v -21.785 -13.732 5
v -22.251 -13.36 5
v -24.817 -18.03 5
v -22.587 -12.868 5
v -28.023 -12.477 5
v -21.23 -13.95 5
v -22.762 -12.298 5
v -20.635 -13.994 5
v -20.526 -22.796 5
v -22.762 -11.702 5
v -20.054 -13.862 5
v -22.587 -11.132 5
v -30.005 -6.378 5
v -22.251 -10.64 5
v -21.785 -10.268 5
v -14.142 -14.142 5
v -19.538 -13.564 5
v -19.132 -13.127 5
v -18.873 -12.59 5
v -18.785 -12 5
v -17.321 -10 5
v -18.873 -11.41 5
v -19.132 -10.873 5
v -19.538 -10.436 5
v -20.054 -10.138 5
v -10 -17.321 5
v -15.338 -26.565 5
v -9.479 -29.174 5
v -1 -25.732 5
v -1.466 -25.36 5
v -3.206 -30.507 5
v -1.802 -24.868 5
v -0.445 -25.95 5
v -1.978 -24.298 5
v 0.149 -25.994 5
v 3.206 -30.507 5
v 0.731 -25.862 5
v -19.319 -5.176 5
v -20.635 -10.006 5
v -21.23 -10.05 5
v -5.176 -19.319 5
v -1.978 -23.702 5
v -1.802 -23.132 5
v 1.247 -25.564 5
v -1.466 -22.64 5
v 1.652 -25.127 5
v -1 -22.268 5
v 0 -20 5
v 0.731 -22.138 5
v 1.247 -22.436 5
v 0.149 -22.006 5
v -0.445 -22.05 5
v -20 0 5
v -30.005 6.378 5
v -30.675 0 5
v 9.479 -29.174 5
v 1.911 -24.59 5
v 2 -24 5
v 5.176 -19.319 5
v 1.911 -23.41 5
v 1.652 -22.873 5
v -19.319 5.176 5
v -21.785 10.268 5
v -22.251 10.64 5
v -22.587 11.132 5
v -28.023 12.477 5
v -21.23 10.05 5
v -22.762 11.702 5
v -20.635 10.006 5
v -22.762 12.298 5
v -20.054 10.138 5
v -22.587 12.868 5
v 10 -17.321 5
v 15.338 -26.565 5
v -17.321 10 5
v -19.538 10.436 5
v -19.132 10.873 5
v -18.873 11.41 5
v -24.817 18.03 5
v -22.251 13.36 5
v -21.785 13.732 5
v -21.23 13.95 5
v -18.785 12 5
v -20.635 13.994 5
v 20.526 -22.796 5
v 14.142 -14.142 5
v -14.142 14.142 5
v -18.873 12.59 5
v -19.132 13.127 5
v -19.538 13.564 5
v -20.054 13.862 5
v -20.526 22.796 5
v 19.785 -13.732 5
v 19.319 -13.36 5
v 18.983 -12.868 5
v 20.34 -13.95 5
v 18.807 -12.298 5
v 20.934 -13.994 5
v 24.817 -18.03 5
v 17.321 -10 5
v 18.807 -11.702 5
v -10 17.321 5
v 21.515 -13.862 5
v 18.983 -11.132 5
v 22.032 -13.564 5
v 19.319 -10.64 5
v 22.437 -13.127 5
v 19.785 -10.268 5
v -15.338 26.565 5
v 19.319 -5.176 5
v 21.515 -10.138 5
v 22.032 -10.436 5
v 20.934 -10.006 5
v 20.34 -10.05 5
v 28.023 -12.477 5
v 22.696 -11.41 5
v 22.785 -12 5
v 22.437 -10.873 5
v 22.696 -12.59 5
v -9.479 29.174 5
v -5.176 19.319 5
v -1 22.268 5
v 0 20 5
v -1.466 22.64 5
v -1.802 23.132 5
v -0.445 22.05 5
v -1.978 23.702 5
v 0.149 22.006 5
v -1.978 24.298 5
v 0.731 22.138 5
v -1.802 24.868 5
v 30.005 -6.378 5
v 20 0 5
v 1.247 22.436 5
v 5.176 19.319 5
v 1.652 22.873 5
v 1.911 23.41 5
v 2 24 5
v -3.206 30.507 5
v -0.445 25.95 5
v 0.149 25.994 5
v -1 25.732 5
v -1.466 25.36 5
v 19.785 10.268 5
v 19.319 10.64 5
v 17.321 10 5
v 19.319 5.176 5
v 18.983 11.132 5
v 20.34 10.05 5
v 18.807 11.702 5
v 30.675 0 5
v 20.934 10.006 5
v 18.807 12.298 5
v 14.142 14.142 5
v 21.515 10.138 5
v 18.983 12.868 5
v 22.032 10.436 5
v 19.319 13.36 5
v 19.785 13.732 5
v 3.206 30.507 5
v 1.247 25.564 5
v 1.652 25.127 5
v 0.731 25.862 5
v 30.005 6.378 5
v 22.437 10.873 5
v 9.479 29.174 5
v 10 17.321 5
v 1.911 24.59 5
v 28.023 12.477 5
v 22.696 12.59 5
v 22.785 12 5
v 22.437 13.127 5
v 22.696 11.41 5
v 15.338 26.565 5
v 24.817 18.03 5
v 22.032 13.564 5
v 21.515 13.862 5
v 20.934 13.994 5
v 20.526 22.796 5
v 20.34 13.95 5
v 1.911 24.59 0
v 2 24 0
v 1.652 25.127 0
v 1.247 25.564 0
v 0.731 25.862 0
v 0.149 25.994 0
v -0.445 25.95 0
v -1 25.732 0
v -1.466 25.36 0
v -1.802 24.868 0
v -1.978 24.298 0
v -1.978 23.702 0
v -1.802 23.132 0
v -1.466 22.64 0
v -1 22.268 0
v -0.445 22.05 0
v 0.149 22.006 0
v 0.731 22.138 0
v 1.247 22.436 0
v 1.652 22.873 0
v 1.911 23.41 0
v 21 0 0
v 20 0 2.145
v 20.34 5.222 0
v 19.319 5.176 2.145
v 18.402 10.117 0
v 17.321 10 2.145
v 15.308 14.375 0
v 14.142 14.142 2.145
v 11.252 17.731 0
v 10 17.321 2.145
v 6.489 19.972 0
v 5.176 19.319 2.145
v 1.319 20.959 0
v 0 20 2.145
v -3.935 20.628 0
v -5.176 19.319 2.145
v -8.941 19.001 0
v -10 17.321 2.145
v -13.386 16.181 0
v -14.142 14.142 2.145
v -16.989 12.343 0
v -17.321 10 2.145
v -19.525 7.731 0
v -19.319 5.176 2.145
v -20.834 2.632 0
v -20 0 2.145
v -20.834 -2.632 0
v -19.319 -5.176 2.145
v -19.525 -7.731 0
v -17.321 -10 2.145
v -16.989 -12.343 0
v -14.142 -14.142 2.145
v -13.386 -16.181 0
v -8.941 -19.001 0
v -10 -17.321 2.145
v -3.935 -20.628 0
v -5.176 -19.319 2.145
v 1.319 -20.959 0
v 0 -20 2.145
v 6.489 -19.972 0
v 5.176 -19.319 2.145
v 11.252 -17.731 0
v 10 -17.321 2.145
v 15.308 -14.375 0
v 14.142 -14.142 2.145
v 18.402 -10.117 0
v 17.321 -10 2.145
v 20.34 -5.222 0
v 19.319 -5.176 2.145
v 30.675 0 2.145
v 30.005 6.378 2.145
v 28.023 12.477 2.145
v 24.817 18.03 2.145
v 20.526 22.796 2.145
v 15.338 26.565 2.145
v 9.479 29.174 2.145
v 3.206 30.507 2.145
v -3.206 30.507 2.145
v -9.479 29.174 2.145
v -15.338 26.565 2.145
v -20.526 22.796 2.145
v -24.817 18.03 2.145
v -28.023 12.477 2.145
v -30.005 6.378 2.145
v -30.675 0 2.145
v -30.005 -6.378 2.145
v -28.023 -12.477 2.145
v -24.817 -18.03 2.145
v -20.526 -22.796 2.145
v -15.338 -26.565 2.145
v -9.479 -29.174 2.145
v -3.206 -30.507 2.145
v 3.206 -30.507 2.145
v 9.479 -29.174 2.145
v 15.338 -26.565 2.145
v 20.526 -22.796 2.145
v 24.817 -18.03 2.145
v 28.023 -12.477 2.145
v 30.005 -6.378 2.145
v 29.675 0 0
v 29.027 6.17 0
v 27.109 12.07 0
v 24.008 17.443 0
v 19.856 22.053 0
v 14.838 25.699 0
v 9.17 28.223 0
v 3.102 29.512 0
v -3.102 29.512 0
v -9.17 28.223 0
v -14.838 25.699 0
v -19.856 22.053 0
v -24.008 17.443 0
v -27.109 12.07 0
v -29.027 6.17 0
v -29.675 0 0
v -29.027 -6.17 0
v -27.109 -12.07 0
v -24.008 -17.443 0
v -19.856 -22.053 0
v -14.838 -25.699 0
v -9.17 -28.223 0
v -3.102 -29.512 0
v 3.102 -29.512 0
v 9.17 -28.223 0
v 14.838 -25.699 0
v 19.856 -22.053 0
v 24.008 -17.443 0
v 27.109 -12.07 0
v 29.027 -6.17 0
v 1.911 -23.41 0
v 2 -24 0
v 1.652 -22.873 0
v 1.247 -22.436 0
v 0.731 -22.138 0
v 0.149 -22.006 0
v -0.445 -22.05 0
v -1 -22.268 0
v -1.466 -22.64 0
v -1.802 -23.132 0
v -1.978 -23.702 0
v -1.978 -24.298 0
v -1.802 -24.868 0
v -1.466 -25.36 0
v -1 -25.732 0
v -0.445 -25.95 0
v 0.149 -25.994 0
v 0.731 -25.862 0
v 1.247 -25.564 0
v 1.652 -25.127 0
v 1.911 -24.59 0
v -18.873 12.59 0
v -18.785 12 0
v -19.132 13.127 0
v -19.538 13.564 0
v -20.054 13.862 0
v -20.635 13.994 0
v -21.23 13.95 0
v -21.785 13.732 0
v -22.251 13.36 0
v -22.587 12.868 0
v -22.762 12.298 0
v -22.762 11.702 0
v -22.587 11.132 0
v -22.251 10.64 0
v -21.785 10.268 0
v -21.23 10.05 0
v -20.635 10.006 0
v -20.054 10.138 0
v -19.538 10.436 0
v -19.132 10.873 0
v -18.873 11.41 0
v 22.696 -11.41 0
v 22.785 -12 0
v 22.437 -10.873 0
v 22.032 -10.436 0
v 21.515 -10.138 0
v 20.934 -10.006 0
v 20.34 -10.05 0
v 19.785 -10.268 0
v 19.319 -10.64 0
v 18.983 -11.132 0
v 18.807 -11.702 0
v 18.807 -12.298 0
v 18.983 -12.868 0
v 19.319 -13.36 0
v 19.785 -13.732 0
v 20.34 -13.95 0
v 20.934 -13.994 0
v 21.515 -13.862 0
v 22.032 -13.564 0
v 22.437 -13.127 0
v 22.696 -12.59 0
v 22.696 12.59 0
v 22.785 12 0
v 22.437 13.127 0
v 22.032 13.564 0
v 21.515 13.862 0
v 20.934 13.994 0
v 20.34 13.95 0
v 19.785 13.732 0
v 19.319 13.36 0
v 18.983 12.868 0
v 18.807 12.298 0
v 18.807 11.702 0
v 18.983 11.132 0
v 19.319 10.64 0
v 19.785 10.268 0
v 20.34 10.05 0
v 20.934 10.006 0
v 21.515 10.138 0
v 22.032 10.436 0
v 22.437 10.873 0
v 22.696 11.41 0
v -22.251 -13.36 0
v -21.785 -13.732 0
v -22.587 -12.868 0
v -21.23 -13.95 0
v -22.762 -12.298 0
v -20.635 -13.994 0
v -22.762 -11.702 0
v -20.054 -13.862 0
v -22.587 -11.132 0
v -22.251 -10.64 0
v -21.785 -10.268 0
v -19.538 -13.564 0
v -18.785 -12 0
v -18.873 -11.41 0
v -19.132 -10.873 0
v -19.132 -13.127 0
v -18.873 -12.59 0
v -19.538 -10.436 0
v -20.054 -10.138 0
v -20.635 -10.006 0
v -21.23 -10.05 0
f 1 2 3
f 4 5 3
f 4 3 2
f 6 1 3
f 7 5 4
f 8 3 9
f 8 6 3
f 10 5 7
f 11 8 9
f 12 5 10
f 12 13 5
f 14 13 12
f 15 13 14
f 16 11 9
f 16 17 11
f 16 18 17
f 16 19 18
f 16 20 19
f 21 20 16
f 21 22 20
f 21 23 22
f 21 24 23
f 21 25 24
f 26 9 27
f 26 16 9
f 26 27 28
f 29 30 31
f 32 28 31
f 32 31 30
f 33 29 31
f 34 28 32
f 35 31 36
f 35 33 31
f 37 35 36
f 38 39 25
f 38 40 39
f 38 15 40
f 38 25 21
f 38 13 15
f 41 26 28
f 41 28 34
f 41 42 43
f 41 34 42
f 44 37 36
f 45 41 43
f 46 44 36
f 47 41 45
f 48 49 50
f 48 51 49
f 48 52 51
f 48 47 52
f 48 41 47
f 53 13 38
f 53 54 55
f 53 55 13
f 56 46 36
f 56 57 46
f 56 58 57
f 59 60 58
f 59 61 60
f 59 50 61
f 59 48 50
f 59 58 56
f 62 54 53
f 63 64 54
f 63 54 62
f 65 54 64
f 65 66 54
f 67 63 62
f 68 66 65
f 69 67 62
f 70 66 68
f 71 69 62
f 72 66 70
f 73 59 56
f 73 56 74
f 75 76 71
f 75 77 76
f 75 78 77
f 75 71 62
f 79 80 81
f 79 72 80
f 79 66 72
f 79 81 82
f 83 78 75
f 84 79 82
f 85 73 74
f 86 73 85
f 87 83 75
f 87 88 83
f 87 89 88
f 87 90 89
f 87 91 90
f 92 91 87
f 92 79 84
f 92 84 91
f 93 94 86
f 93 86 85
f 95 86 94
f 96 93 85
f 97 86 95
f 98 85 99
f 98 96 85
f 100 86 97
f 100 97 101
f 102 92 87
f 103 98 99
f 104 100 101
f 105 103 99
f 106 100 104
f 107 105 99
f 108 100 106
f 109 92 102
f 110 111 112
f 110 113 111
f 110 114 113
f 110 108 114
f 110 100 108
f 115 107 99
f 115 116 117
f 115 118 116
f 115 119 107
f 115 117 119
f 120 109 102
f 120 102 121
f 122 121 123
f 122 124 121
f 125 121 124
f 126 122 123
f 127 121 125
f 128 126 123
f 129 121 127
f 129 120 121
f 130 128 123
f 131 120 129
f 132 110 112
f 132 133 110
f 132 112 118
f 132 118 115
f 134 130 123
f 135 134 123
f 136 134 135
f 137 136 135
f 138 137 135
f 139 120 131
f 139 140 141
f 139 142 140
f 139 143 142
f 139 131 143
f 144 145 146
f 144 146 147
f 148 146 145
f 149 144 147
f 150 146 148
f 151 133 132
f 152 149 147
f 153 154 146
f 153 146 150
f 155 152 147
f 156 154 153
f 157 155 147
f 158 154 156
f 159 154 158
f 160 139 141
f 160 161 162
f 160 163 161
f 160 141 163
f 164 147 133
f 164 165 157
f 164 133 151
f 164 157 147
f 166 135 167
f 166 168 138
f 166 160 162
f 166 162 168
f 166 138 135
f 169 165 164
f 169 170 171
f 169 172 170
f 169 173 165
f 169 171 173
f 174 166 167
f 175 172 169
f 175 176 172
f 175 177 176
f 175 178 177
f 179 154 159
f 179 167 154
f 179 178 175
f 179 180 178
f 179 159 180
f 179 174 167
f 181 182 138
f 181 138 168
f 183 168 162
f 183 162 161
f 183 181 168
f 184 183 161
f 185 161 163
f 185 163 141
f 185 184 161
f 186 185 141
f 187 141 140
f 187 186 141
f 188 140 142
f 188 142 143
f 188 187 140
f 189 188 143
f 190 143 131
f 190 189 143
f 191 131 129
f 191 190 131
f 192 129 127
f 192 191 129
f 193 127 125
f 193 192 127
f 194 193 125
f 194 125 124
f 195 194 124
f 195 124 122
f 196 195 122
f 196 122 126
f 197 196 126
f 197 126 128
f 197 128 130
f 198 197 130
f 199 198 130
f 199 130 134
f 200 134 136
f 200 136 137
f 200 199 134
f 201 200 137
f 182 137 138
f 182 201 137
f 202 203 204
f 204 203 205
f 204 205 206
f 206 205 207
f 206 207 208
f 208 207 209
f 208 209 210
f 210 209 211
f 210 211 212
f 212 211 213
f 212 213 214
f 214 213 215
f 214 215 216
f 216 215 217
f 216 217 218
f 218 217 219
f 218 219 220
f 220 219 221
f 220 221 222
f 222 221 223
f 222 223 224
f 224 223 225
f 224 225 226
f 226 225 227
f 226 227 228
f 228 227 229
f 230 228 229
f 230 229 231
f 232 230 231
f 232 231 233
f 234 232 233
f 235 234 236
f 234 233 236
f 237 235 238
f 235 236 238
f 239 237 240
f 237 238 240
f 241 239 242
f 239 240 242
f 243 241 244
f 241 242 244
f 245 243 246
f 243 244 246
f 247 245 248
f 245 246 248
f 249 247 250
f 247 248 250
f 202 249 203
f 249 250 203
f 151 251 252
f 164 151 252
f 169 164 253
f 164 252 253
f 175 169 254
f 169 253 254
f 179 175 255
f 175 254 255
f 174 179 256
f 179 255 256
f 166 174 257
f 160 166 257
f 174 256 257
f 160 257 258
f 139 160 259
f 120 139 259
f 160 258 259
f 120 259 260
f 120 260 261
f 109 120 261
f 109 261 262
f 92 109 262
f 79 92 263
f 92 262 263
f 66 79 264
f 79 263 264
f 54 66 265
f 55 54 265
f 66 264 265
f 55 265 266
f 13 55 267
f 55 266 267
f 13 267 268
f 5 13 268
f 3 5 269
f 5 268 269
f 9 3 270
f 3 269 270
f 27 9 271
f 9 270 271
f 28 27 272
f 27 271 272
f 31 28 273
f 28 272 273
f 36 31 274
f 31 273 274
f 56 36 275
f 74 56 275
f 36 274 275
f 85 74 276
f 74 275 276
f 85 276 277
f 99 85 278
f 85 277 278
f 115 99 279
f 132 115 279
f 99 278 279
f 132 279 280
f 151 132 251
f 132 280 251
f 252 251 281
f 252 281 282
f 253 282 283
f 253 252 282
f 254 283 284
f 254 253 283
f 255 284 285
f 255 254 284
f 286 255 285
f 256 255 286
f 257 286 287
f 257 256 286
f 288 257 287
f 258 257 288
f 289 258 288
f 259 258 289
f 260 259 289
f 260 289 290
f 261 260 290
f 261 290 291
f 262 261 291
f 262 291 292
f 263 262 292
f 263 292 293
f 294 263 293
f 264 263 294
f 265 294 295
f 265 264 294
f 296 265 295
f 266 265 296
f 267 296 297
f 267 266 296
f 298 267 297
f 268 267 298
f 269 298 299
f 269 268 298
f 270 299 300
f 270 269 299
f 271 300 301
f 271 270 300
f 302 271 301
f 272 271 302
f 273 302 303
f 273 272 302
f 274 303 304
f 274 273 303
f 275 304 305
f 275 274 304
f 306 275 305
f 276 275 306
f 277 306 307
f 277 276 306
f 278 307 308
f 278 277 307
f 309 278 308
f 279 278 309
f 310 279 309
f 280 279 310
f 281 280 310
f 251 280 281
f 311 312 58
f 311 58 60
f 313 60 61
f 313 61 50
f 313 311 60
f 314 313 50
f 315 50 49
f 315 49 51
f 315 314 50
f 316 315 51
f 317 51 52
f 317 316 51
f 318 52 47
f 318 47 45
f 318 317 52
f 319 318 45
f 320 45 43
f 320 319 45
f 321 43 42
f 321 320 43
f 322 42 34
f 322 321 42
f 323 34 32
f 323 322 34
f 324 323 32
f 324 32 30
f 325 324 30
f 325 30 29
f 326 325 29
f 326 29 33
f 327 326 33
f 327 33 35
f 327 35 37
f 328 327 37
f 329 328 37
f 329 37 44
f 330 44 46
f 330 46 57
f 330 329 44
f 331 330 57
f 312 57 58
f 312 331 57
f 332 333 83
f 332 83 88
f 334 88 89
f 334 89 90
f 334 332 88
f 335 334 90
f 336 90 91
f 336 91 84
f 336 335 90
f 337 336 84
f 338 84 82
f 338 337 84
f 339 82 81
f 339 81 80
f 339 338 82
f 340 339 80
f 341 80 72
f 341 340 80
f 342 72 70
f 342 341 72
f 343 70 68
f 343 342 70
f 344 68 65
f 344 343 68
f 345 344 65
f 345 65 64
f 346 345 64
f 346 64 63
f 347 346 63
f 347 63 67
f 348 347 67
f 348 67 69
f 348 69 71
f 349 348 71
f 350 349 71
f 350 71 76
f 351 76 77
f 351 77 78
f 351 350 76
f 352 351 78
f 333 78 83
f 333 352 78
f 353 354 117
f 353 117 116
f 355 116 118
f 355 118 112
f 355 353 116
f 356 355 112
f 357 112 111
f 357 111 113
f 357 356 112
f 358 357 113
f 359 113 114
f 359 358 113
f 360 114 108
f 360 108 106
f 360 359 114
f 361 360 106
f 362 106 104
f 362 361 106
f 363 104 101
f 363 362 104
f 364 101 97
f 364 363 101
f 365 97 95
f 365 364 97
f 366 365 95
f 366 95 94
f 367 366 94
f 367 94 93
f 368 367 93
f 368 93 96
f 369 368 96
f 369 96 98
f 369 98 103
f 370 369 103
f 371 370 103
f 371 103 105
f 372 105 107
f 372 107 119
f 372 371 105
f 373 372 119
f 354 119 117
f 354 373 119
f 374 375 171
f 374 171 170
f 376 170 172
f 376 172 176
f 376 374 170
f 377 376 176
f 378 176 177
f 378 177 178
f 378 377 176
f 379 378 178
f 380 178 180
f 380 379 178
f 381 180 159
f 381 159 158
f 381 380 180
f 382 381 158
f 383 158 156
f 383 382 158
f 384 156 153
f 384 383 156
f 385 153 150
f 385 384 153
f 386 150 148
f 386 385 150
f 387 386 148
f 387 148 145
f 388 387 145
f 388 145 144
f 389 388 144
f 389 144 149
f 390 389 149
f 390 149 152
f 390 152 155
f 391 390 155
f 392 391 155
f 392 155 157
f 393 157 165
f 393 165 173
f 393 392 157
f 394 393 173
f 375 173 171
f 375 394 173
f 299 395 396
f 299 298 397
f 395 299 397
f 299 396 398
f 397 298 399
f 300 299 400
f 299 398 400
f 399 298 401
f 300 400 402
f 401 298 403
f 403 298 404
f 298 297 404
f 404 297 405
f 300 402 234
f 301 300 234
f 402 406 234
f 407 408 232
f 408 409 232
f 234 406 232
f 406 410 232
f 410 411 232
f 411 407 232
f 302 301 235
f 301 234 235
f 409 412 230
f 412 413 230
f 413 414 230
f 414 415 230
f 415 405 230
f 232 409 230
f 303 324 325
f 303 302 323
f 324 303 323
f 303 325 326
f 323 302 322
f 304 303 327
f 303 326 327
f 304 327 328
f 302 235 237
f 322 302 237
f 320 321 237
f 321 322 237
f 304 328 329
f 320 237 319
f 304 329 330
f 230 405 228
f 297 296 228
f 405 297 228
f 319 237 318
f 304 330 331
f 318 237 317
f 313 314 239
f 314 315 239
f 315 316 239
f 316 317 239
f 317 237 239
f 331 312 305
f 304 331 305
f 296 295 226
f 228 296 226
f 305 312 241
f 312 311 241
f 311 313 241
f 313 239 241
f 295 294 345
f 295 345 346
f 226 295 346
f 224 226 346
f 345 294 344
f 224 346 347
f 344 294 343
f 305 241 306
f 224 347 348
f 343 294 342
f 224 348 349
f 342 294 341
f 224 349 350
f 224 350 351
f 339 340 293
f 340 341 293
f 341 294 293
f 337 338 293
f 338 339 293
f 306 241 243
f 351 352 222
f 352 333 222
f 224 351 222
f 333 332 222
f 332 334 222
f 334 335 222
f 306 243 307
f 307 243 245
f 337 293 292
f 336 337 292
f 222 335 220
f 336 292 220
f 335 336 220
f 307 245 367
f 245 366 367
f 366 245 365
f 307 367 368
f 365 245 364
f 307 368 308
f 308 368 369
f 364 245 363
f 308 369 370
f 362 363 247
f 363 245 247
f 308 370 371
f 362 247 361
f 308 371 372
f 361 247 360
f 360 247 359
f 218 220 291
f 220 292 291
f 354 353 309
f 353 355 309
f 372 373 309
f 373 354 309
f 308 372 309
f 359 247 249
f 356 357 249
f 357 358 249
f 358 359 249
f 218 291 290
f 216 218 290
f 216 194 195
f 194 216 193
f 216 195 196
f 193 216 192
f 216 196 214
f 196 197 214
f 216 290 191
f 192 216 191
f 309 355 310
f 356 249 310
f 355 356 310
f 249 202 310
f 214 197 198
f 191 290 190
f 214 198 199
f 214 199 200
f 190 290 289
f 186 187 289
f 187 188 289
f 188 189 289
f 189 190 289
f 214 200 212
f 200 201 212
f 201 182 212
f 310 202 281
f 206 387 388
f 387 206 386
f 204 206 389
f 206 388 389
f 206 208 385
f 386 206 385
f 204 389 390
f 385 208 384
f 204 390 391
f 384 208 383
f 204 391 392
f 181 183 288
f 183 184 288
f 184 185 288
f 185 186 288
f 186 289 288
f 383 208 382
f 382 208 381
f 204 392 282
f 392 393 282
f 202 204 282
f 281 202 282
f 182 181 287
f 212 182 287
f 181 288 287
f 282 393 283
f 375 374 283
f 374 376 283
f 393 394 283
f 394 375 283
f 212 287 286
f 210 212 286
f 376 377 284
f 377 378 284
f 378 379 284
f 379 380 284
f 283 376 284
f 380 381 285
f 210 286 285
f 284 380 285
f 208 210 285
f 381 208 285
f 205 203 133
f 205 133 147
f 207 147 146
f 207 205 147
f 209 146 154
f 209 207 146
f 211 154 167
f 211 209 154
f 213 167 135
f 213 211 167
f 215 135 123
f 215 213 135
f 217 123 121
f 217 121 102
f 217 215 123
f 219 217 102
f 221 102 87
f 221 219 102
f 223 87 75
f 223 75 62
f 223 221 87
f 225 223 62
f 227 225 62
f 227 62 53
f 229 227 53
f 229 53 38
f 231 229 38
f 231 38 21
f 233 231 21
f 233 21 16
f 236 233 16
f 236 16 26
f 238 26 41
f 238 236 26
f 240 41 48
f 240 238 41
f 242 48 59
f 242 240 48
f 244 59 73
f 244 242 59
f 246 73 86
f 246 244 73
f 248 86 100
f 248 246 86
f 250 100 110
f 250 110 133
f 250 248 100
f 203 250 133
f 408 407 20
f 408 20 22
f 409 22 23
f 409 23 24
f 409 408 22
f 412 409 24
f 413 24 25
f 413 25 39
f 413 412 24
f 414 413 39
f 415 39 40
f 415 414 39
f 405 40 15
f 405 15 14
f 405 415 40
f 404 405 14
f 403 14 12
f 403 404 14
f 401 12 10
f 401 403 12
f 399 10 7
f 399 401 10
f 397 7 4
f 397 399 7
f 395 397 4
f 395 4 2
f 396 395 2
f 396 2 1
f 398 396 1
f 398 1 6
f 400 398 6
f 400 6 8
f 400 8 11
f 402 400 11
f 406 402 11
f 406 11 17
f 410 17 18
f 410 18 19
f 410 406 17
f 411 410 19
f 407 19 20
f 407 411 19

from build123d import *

# Parameters (mm, degrees)
SKETCH1_R           = 30.675
SKETCH1_R_2         = 2
SKETCH1_R_3         = 20
BOSS_EXTRUDE1_DEPTH = 5
CHAMFER6_SIZE       = 1
CHAMFER6_SIZE2      = 2.144506921


with BuildPart() as part:
    # Sketch1 → Boss-Extrude1 (new body)
    with BuildSketch(Plane.XY):
        Circle(SKETCH1_R)
        with Locations((0, 24)):
            Circle(SKETCH1_R_2, mode=Mode.SUBTRACT)
        Circle(SKETCH1_R_3, mode=Mode.SUBTRACT)
        with Locations((20.784609691, 12)):
            Circle(SKETCH1_R_2, mode=Mode.SUBTRACT)
        with Locations((20.784609691, -12)):
            Circle(SKETCH1_R_2, mode=Mode.SUBTRACT)
        with Locations((0, -24)):
            Circle(SKETCH1_R_2, mode=Mode.SUBTRACT)
        with Locations((-20.784609691, -12)):
            Circle(SKETCH1_R_2, mode=Mode.SUBTRACT)
        with Locations((-20.784609691, 12)):
            Circle(SKETCH1_R_2, mode=Mode.SUBTRACT)
    extrude(amount=BOSS_EXTRUDE1_DEPTH)

    # Chamfer6
    chamfer6_edges = [part.edges().sort_by_distance(p)[0] for p in [
        (-30.675, 0, 0),
        (-20, 0, 0),
    ]]
    chamfer6_side = [part.faces().sort_by_distance(p)[0] for p in [
        (-29.807379979, 0, 0),
    ]]
    chamfer(chamfer6_edges, length=CHAMFER6_SIZE, length2=CHAMFER6_SIZE2, reference=chamfer6_side[0])


solid = part.part
